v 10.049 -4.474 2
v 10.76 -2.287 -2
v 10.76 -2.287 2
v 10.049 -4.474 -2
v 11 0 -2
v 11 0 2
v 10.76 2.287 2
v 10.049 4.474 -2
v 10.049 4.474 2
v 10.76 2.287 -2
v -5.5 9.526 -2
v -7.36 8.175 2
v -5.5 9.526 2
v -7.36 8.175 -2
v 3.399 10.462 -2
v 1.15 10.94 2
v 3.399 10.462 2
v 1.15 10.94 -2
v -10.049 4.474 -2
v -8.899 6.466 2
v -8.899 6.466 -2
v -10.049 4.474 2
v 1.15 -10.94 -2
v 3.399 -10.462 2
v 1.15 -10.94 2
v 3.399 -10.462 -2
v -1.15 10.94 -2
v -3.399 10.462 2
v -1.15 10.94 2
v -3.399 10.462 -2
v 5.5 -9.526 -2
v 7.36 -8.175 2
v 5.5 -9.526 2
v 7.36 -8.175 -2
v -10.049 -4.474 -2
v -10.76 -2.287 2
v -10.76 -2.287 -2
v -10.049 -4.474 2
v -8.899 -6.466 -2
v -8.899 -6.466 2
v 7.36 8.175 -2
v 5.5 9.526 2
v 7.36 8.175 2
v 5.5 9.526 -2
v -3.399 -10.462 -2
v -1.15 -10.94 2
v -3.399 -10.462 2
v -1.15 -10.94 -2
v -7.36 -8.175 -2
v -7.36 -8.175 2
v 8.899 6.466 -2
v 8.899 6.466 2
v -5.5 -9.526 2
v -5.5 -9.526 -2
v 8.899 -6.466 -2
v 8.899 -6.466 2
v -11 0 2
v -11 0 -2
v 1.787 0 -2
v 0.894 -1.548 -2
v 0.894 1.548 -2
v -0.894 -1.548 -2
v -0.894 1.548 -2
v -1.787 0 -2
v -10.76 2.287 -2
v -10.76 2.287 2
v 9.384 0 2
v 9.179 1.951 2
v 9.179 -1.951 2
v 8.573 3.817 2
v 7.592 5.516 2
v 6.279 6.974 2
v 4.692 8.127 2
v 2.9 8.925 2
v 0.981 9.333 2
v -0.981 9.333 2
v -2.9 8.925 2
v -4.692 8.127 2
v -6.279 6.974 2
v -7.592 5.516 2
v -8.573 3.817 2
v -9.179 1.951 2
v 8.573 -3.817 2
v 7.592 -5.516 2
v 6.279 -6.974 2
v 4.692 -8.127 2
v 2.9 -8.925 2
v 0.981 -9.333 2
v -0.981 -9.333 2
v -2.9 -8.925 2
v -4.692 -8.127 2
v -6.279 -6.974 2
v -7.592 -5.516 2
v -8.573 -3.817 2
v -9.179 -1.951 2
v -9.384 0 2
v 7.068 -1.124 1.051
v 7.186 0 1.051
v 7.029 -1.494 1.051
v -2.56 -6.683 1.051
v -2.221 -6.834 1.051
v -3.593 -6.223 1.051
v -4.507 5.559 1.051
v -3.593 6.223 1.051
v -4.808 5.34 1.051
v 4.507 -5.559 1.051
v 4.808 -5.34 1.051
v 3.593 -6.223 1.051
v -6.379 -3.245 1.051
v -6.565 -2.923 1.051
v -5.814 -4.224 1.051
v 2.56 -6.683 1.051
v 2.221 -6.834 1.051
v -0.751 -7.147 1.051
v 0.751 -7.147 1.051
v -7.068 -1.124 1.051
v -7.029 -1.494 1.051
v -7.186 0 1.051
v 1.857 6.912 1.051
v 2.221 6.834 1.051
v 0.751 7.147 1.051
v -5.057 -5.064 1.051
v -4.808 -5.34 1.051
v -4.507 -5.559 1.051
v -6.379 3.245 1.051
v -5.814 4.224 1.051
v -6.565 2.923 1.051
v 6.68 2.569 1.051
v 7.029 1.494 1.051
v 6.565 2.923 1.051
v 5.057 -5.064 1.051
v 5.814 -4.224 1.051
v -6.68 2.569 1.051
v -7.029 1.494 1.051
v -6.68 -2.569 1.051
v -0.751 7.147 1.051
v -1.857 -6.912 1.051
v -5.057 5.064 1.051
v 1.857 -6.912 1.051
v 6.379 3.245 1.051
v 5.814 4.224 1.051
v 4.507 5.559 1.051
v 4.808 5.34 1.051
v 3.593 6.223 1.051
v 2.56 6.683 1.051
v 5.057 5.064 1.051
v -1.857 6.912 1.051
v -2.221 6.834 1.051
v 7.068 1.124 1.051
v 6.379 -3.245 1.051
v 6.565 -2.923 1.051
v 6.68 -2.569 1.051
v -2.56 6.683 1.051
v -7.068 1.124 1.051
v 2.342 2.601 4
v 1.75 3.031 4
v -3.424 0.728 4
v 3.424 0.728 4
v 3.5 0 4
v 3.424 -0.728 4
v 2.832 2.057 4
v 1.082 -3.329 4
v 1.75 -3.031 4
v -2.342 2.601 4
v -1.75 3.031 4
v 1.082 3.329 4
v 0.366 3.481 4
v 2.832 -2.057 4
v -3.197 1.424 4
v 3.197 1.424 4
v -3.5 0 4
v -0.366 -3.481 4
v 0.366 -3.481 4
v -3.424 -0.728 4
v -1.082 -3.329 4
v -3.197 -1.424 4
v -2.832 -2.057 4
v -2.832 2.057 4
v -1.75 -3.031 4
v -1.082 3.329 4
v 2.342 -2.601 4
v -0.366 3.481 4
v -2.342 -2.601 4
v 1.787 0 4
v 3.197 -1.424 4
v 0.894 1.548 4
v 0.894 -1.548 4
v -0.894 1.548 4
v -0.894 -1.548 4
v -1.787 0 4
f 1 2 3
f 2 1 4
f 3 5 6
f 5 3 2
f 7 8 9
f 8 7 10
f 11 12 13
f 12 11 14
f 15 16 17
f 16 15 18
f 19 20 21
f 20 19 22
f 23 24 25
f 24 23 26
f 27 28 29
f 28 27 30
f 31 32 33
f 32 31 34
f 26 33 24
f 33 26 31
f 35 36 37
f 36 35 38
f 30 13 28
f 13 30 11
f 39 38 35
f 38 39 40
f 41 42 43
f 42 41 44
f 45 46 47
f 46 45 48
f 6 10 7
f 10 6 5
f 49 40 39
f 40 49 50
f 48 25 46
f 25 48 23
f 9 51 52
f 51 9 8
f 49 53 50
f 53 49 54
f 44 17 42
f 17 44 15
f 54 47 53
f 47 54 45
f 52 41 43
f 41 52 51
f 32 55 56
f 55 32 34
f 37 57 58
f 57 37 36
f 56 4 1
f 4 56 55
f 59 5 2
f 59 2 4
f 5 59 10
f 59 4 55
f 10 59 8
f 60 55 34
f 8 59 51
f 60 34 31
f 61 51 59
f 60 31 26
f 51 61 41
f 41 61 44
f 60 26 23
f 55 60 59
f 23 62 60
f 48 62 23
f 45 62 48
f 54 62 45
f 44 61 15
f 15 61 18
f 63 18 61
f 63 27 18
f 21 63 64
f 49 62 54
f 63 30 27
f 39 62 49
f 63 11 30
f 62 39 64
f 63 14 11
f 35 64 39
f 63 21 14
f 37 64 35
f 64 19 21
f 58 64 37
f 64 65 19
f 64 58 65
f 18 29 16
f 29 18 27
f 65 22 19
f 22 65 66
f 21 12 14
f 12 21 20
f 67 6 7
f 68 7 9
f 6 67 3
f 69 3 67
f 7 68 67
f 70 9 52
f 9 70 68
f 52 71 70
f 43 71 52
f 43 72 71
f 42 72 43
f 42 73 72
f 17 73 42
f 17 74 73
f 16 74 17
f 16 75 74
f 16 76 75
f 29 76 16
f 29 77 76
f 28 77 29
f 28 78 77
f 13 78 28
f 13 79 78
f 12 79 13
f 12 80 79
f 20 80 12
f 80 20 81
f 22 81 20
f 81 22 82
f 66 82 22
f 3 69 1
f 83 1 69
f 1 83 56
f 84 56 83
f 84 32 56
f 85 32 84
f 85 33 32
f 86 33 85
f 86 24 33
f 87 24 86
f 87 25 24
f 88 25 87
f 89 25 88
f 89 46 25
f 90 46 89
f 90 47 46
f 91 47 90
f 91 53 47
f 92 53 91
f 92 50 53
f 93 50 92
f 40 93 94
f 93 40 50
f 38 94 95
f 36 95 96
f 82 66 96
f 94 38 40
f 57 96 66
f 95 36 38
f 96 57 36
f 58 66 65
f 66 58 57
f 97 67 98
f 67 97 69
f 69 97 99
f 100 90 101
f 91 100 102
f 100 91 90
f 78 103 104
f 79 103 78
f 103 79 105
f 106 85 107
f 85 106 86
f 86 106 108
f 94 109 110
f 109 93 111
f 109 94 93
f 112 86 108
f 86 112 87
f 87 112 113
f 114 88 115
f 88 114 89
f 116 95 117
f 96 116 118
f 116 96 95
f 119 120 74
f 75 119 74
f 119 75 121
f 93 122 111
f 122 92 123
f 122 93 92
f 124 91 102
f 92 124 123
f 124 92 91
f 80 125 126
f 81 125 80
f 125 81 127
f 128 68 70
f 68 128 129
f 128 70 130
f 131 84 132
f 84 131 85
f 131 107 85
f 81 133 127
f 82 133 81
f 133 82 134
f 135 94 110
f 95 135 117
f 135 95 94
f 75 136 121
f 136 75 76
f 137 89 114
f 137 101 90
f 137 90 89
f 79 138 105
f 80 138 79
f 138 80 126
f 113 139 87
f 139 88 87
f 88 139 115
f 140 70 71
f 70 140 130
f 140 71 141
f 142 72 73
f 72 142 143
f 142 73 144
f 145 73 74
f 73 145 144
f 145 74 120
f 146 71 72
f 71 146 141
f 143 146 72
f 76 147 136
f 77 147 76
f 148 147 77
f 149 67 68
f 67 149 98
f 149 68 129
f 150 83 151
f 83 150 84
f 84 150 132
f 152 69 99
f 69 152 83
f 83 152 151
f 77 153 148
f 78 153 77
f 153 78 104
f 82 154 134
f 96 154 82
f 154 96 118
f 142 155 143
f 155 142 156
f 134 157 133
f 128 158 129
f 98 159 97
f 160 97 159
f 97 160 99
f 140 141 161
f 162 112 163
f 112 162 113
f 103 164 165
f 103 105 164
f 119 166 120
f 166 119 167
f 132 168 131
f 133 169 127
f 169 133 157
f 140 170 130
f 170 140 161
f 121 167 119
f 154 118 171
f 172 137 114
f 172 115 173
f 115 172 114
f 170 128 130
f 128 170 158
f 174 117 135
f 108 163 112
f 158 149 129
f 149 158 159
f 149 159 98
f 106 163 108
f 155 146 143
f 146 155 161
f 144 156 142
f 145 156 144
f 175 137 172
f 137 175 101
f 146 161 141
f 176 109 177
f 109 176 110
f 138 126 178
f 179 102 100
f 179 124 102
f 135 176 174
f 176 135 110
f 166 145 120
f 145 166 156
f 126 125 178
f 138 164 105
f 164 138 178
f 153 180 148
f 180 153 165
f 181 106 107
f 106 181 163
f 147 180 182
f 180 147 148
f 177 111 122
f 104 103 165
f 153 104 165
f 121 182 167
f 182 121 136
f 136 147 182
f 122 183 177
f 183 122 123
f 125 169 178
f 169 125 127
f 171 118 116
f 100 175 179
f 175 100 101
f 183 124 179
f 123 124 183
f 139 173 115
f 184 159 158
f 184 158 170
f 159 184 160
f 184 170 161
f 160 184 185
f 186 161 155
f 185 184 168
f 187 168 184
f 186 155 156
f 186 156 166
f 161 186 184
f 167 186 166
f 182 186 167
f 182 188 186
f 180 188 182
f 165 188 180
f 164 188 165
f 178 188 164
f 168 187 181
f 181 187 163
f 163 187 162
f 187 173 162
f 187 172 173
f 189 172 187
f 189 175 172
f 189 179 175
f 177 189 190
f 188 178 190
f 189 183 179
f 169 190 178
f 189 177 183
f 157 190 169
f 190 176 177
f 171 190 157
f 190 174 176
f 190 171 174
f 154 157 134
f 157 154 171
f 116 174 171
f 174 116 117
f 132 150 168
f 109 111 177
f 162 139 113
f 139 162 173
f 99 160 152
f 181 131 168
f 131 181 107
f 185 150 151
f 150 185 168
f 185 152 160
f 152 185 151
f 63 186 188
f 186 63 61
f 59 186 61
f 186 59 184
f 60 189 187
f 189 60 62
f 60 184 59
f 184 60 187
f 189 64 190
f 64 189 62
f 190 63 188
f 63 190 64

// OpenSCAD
module duplo_nipple(outer = 9.35, inner = 6.93, height = 4.5)
{
  difference()
  {
    cylinder(height,outer/2,outer/2,center=true);
    cylinder(height+1,inner/2,inner/2,center=true);
  }
}

module duplo_top(x = 2, y = 4, spacing = 16.0, parimeter = 3.2+9.35/2, height = 4.5, thickness = 2)
{
  union()
  {
    for (i = [0:x-1]) 
    {
      for (j = [0:y-1])
      {
        translate([((i-(x-1)/2)*spacing),((j-(y-1)/2)*spacing),(height+thickness)/2]) duplo_nipple();
      }
    }
    cube([(x-1)*spacing+2*parimeter,(y-1)*spacing+2*parimeter,thickness],center=true);
  }
}


module duplo_support(width, height, y = 4, spacing = 16.0, parimeter = 3.2+9.35/2, height = 4.5, thickness = 2)
{
  cube([width,(y-1)*spacing+2*parimeter,height],center=true);
}


module wheel(wheel_thinkness = 4.0, 
wheel_diameter = 22.0,
axel_diameter = 5.0,
axel_mount_depth = 6.0)
{
  axel_support_thinkness = 1;
  center_slant = wheel_diameter;
  center_diameter = axel_mount_depth + axel_support_thinkness;
  difference()
  {
    union()
    {
      difference()
      {
        cylinder(wheel_thinkness,wheel_diameter/2,wheel_diameter/2,center=true);
        cylinder(wheel_thinkness+0.1,(wheel_diameter-3)/2,0,center=true);
      }
      translate([0,0,-(axel_mount_depth-wheel_thinkness)/2]) cylinder(axel_mount_depth,center_diameter/2,center_slant/2,center=true);
    }
    translate([0,0,-(axel_mount_depth-wheel_thinkness)/2]) cylinder(axel_mount_depth+1,axel_diameter/2,axel_diameter/2,center=true);
  }
}

module simple_axel(length, thickness)
{
  cylinder(length,thickness/2,thickness/2,center=true);
}

module wheel_assembly(wheel_base = 25.35,
wheel_thinkness = 4.0, 
wheel_diameter = 22.0,
axel_diameter = 3.175,
axel_mount_depth = 6.0)
{
  %translate([wheel_base/2,0,0]) rotate([0,-90,0]) wheel(wheel_thinkness, wheel_diameter, axel_diameter, axel_mount_depth);
  %translate([-wheel_base/2,0,0]) rotate([0,90,0]) wheel(wheel_thinkness, wheel_diameter, axel_diameter, axel_mount_depth);
  rotate([0,90,0]) simple_axel(wheel_base+2*(axel_mount_depth-wheel_thinkness/2), axel_diameter);
}

module tack()
{
  pin_diameter = 1.4;
  pin_length = 17;
  tack_diameter = 11;
  tack_thickness = 3.65;
  color("gray") union()
  {
    cylinder(pin_length,pin_diameter/2,pin_diameter/2,center=true);
    translate([0,0,(pin_length-tack_thickness)/2]) cylinder(tack_thickness,tack_diameter/2,pin_diameter/2,center=true);
  }
}

module magnet()
{
  od = 12.7;
  id = 3.175;
  thickness = 3.175;
  color("lightblue") difference()
  {
    cylinder(thickness,od/2,od/2,center=true);
    cylinder(thickness+0.1,id/2,id/2,center=true);
  }
}

module magnet_assembly()
{
  tack();
  translate([0,0,(17/2-(3.6+3.175/2))]) magnet();
}

module magnet_holder(magnet_od = 12.7+0.7,
pin_od = 1.4,
pin_depth = 10.225,
magnet_depth = 3.175,
thickness = 1)
{
  holder_od = magnet_od + 2 * thickness;
  difference()
  {
    union()
    {
      cylinder(pin_depth+magnet_depth,holder_od/2,holder_od/2,center=true);
      translate([0,thickness-holder_od/2],0) cube([holder_od/2,2 * thickness,pin_depth+magnet_depth],center=true);
    }
    translate([0,0,pin_depth/2]) cylinder(magnet_depth+0.1,magnet_od/2,magnet_od/2,center=true);
    cylinder(pin_depth+magnet_depth,pin_od/2,pin_od/2,center=true);
  }
}

module magnet_holder1()
{
  magnet_holder(9.525+0.6,1.4,10.225,1.6);
}

module short_car(mode = 0)
{
  //mode 0 is the body with wheel assembly grayed out
  //mode 1 shows the wheels only on there side
  //mode 2 shows the axel only
  
  spacing = 40;
  
  wheel_base = 25.35;
  wheel_thinkness = 4.0;
  wheel_diameter = 22.0;
  axel_diameter = 3.175+0.4;  //0.125 inch rod
  axel_clearance = 0.4 + axel_diameter;
  wheel_well = wheel_diameter + 3;
  axel_mount_depth = 6.0;
  
  magnet_height = 16.5-2.6;
  
  
  if(mode == 0)
  {
    //wheel assembly place holder
    %translate([0,spacing/2,0]) wheel_assembly(wheel_base,wheel_thinkness,wheel_diameter,axel_diameter,axel_mount_depth);
    %translate([0,-spacing/2,0]) wheel_assembly(wheel_base,wheel_thinkness,wheel_diameter,axel_diameter,axel_mount_depth);
    
    //duplo train top
    translate([0,0,14]) duplo_top(x = 2, y = 4);
    
    //train body
    body_width = wheel_base-wheel_thinkness*2;
    well_depth = (32 - body_width)/2;
    difference()
    {
      union()
      {
        //magnet holders
        translate([0,-32,magnet_height-wheel_diameter/2-0.125]) rotate([90,0,0]) magnet_holder1();
        translate([0,32,magnet_height-wheel_diameter/2-0.125]) rotate([-90,180,0]) magnet_holder1();
        //main body
        translate([0,0,wheel_diameter/4]) cube([body_width,64,14+axel_diameter],center=true);
        difference()
        {
          union()
          {
            translate([(32-10)/2,0,12]) cube([10,64,5],center=true);
            translate([-(32-10)/2,0,12]) cube([10,64,5],center=true);
          }
          translate([(32-10)/2,0,12]) rotate([0,-30,0]) translate([0,0,-4]) cube([10,65,5],center=true);
          translate([-(32-10)/2,0,12]) rotate([0,30,0]) translate([0,0,-4]) cube([10,65,5],center=true);
        }
      }
      translate([0,spacing/2,0]) rotate([0,90,0]) cylinder(body_width+0.1,axel_clearance/2,axel_clearance/2,center=true);
      translate([0,-spacing/2,0]) rotate([0,90,0]) cylinder(body_width+0.1,axel_clearance/2,axel_clearance/2,center=true);
      translate([0,0,-wheel_diameter/3]) rotate([0,90,0]) cylinder(body_width+0.1,wheel_diameter/2,wheel_diameter/2,center=true);
      //removing wheel well area
      translate([0,spacing/2,0]) translate([wheel_base/2,0,0]) rotate([0,-90,0])  cylinder(well_depth,wheel_well/2,wheel_well/2,center=true);
      translate([0,-spacing/2,0]) translate([wheel_base/2,0,0]) rotate([0,-90,0])  cylinder(well_depth,wheel_well/2,wheel_well/2,center=true);
      translate([0,spacing/2,0]) translate([-wheel_base/2,0,0]) rotate([0,-90,0])  cylinder(well_depth,wheel_well/2,wheel_well/2,center=true);
      translate([0,-spacing/2,0]) translate([-wheel_base/2,0,0]) rotate([0,-90,0])  cylinder(well_depth,wheel_well/2,wheel_well/2,center=true);
      
      //ensure the pins have a full hole
      pin_od = 1.4;
      translate([0,-32,magnet_height-wheel_diameter/2]) rotate([90,0,0]) cylinder(17,pin_od/2,pin_od/2,center=true);
      translate([0,32,magnet_height-wheel_diameter/2]) rotate([-90,0,0]) cylinder(17,pin_od/2,pin_od/2,center=true);
    }
  }
  else
  {
    if(mode == 1)
    {
      rotate([180,0,0]) wheel(wheel_thinkness, wheel_diameter, axel_diameter, axel_mount_depth);
    }
    else
    {
      rotate([90,0,0]) simple_axel(wheel_base+2*(axel_mount_depth-wheel_thinkness/2), axel_diameter);
    }
  }
  
}

// train car body 
short_car(1);
// wheel only
// short_car(1);
// axel only
// short_car(2);
